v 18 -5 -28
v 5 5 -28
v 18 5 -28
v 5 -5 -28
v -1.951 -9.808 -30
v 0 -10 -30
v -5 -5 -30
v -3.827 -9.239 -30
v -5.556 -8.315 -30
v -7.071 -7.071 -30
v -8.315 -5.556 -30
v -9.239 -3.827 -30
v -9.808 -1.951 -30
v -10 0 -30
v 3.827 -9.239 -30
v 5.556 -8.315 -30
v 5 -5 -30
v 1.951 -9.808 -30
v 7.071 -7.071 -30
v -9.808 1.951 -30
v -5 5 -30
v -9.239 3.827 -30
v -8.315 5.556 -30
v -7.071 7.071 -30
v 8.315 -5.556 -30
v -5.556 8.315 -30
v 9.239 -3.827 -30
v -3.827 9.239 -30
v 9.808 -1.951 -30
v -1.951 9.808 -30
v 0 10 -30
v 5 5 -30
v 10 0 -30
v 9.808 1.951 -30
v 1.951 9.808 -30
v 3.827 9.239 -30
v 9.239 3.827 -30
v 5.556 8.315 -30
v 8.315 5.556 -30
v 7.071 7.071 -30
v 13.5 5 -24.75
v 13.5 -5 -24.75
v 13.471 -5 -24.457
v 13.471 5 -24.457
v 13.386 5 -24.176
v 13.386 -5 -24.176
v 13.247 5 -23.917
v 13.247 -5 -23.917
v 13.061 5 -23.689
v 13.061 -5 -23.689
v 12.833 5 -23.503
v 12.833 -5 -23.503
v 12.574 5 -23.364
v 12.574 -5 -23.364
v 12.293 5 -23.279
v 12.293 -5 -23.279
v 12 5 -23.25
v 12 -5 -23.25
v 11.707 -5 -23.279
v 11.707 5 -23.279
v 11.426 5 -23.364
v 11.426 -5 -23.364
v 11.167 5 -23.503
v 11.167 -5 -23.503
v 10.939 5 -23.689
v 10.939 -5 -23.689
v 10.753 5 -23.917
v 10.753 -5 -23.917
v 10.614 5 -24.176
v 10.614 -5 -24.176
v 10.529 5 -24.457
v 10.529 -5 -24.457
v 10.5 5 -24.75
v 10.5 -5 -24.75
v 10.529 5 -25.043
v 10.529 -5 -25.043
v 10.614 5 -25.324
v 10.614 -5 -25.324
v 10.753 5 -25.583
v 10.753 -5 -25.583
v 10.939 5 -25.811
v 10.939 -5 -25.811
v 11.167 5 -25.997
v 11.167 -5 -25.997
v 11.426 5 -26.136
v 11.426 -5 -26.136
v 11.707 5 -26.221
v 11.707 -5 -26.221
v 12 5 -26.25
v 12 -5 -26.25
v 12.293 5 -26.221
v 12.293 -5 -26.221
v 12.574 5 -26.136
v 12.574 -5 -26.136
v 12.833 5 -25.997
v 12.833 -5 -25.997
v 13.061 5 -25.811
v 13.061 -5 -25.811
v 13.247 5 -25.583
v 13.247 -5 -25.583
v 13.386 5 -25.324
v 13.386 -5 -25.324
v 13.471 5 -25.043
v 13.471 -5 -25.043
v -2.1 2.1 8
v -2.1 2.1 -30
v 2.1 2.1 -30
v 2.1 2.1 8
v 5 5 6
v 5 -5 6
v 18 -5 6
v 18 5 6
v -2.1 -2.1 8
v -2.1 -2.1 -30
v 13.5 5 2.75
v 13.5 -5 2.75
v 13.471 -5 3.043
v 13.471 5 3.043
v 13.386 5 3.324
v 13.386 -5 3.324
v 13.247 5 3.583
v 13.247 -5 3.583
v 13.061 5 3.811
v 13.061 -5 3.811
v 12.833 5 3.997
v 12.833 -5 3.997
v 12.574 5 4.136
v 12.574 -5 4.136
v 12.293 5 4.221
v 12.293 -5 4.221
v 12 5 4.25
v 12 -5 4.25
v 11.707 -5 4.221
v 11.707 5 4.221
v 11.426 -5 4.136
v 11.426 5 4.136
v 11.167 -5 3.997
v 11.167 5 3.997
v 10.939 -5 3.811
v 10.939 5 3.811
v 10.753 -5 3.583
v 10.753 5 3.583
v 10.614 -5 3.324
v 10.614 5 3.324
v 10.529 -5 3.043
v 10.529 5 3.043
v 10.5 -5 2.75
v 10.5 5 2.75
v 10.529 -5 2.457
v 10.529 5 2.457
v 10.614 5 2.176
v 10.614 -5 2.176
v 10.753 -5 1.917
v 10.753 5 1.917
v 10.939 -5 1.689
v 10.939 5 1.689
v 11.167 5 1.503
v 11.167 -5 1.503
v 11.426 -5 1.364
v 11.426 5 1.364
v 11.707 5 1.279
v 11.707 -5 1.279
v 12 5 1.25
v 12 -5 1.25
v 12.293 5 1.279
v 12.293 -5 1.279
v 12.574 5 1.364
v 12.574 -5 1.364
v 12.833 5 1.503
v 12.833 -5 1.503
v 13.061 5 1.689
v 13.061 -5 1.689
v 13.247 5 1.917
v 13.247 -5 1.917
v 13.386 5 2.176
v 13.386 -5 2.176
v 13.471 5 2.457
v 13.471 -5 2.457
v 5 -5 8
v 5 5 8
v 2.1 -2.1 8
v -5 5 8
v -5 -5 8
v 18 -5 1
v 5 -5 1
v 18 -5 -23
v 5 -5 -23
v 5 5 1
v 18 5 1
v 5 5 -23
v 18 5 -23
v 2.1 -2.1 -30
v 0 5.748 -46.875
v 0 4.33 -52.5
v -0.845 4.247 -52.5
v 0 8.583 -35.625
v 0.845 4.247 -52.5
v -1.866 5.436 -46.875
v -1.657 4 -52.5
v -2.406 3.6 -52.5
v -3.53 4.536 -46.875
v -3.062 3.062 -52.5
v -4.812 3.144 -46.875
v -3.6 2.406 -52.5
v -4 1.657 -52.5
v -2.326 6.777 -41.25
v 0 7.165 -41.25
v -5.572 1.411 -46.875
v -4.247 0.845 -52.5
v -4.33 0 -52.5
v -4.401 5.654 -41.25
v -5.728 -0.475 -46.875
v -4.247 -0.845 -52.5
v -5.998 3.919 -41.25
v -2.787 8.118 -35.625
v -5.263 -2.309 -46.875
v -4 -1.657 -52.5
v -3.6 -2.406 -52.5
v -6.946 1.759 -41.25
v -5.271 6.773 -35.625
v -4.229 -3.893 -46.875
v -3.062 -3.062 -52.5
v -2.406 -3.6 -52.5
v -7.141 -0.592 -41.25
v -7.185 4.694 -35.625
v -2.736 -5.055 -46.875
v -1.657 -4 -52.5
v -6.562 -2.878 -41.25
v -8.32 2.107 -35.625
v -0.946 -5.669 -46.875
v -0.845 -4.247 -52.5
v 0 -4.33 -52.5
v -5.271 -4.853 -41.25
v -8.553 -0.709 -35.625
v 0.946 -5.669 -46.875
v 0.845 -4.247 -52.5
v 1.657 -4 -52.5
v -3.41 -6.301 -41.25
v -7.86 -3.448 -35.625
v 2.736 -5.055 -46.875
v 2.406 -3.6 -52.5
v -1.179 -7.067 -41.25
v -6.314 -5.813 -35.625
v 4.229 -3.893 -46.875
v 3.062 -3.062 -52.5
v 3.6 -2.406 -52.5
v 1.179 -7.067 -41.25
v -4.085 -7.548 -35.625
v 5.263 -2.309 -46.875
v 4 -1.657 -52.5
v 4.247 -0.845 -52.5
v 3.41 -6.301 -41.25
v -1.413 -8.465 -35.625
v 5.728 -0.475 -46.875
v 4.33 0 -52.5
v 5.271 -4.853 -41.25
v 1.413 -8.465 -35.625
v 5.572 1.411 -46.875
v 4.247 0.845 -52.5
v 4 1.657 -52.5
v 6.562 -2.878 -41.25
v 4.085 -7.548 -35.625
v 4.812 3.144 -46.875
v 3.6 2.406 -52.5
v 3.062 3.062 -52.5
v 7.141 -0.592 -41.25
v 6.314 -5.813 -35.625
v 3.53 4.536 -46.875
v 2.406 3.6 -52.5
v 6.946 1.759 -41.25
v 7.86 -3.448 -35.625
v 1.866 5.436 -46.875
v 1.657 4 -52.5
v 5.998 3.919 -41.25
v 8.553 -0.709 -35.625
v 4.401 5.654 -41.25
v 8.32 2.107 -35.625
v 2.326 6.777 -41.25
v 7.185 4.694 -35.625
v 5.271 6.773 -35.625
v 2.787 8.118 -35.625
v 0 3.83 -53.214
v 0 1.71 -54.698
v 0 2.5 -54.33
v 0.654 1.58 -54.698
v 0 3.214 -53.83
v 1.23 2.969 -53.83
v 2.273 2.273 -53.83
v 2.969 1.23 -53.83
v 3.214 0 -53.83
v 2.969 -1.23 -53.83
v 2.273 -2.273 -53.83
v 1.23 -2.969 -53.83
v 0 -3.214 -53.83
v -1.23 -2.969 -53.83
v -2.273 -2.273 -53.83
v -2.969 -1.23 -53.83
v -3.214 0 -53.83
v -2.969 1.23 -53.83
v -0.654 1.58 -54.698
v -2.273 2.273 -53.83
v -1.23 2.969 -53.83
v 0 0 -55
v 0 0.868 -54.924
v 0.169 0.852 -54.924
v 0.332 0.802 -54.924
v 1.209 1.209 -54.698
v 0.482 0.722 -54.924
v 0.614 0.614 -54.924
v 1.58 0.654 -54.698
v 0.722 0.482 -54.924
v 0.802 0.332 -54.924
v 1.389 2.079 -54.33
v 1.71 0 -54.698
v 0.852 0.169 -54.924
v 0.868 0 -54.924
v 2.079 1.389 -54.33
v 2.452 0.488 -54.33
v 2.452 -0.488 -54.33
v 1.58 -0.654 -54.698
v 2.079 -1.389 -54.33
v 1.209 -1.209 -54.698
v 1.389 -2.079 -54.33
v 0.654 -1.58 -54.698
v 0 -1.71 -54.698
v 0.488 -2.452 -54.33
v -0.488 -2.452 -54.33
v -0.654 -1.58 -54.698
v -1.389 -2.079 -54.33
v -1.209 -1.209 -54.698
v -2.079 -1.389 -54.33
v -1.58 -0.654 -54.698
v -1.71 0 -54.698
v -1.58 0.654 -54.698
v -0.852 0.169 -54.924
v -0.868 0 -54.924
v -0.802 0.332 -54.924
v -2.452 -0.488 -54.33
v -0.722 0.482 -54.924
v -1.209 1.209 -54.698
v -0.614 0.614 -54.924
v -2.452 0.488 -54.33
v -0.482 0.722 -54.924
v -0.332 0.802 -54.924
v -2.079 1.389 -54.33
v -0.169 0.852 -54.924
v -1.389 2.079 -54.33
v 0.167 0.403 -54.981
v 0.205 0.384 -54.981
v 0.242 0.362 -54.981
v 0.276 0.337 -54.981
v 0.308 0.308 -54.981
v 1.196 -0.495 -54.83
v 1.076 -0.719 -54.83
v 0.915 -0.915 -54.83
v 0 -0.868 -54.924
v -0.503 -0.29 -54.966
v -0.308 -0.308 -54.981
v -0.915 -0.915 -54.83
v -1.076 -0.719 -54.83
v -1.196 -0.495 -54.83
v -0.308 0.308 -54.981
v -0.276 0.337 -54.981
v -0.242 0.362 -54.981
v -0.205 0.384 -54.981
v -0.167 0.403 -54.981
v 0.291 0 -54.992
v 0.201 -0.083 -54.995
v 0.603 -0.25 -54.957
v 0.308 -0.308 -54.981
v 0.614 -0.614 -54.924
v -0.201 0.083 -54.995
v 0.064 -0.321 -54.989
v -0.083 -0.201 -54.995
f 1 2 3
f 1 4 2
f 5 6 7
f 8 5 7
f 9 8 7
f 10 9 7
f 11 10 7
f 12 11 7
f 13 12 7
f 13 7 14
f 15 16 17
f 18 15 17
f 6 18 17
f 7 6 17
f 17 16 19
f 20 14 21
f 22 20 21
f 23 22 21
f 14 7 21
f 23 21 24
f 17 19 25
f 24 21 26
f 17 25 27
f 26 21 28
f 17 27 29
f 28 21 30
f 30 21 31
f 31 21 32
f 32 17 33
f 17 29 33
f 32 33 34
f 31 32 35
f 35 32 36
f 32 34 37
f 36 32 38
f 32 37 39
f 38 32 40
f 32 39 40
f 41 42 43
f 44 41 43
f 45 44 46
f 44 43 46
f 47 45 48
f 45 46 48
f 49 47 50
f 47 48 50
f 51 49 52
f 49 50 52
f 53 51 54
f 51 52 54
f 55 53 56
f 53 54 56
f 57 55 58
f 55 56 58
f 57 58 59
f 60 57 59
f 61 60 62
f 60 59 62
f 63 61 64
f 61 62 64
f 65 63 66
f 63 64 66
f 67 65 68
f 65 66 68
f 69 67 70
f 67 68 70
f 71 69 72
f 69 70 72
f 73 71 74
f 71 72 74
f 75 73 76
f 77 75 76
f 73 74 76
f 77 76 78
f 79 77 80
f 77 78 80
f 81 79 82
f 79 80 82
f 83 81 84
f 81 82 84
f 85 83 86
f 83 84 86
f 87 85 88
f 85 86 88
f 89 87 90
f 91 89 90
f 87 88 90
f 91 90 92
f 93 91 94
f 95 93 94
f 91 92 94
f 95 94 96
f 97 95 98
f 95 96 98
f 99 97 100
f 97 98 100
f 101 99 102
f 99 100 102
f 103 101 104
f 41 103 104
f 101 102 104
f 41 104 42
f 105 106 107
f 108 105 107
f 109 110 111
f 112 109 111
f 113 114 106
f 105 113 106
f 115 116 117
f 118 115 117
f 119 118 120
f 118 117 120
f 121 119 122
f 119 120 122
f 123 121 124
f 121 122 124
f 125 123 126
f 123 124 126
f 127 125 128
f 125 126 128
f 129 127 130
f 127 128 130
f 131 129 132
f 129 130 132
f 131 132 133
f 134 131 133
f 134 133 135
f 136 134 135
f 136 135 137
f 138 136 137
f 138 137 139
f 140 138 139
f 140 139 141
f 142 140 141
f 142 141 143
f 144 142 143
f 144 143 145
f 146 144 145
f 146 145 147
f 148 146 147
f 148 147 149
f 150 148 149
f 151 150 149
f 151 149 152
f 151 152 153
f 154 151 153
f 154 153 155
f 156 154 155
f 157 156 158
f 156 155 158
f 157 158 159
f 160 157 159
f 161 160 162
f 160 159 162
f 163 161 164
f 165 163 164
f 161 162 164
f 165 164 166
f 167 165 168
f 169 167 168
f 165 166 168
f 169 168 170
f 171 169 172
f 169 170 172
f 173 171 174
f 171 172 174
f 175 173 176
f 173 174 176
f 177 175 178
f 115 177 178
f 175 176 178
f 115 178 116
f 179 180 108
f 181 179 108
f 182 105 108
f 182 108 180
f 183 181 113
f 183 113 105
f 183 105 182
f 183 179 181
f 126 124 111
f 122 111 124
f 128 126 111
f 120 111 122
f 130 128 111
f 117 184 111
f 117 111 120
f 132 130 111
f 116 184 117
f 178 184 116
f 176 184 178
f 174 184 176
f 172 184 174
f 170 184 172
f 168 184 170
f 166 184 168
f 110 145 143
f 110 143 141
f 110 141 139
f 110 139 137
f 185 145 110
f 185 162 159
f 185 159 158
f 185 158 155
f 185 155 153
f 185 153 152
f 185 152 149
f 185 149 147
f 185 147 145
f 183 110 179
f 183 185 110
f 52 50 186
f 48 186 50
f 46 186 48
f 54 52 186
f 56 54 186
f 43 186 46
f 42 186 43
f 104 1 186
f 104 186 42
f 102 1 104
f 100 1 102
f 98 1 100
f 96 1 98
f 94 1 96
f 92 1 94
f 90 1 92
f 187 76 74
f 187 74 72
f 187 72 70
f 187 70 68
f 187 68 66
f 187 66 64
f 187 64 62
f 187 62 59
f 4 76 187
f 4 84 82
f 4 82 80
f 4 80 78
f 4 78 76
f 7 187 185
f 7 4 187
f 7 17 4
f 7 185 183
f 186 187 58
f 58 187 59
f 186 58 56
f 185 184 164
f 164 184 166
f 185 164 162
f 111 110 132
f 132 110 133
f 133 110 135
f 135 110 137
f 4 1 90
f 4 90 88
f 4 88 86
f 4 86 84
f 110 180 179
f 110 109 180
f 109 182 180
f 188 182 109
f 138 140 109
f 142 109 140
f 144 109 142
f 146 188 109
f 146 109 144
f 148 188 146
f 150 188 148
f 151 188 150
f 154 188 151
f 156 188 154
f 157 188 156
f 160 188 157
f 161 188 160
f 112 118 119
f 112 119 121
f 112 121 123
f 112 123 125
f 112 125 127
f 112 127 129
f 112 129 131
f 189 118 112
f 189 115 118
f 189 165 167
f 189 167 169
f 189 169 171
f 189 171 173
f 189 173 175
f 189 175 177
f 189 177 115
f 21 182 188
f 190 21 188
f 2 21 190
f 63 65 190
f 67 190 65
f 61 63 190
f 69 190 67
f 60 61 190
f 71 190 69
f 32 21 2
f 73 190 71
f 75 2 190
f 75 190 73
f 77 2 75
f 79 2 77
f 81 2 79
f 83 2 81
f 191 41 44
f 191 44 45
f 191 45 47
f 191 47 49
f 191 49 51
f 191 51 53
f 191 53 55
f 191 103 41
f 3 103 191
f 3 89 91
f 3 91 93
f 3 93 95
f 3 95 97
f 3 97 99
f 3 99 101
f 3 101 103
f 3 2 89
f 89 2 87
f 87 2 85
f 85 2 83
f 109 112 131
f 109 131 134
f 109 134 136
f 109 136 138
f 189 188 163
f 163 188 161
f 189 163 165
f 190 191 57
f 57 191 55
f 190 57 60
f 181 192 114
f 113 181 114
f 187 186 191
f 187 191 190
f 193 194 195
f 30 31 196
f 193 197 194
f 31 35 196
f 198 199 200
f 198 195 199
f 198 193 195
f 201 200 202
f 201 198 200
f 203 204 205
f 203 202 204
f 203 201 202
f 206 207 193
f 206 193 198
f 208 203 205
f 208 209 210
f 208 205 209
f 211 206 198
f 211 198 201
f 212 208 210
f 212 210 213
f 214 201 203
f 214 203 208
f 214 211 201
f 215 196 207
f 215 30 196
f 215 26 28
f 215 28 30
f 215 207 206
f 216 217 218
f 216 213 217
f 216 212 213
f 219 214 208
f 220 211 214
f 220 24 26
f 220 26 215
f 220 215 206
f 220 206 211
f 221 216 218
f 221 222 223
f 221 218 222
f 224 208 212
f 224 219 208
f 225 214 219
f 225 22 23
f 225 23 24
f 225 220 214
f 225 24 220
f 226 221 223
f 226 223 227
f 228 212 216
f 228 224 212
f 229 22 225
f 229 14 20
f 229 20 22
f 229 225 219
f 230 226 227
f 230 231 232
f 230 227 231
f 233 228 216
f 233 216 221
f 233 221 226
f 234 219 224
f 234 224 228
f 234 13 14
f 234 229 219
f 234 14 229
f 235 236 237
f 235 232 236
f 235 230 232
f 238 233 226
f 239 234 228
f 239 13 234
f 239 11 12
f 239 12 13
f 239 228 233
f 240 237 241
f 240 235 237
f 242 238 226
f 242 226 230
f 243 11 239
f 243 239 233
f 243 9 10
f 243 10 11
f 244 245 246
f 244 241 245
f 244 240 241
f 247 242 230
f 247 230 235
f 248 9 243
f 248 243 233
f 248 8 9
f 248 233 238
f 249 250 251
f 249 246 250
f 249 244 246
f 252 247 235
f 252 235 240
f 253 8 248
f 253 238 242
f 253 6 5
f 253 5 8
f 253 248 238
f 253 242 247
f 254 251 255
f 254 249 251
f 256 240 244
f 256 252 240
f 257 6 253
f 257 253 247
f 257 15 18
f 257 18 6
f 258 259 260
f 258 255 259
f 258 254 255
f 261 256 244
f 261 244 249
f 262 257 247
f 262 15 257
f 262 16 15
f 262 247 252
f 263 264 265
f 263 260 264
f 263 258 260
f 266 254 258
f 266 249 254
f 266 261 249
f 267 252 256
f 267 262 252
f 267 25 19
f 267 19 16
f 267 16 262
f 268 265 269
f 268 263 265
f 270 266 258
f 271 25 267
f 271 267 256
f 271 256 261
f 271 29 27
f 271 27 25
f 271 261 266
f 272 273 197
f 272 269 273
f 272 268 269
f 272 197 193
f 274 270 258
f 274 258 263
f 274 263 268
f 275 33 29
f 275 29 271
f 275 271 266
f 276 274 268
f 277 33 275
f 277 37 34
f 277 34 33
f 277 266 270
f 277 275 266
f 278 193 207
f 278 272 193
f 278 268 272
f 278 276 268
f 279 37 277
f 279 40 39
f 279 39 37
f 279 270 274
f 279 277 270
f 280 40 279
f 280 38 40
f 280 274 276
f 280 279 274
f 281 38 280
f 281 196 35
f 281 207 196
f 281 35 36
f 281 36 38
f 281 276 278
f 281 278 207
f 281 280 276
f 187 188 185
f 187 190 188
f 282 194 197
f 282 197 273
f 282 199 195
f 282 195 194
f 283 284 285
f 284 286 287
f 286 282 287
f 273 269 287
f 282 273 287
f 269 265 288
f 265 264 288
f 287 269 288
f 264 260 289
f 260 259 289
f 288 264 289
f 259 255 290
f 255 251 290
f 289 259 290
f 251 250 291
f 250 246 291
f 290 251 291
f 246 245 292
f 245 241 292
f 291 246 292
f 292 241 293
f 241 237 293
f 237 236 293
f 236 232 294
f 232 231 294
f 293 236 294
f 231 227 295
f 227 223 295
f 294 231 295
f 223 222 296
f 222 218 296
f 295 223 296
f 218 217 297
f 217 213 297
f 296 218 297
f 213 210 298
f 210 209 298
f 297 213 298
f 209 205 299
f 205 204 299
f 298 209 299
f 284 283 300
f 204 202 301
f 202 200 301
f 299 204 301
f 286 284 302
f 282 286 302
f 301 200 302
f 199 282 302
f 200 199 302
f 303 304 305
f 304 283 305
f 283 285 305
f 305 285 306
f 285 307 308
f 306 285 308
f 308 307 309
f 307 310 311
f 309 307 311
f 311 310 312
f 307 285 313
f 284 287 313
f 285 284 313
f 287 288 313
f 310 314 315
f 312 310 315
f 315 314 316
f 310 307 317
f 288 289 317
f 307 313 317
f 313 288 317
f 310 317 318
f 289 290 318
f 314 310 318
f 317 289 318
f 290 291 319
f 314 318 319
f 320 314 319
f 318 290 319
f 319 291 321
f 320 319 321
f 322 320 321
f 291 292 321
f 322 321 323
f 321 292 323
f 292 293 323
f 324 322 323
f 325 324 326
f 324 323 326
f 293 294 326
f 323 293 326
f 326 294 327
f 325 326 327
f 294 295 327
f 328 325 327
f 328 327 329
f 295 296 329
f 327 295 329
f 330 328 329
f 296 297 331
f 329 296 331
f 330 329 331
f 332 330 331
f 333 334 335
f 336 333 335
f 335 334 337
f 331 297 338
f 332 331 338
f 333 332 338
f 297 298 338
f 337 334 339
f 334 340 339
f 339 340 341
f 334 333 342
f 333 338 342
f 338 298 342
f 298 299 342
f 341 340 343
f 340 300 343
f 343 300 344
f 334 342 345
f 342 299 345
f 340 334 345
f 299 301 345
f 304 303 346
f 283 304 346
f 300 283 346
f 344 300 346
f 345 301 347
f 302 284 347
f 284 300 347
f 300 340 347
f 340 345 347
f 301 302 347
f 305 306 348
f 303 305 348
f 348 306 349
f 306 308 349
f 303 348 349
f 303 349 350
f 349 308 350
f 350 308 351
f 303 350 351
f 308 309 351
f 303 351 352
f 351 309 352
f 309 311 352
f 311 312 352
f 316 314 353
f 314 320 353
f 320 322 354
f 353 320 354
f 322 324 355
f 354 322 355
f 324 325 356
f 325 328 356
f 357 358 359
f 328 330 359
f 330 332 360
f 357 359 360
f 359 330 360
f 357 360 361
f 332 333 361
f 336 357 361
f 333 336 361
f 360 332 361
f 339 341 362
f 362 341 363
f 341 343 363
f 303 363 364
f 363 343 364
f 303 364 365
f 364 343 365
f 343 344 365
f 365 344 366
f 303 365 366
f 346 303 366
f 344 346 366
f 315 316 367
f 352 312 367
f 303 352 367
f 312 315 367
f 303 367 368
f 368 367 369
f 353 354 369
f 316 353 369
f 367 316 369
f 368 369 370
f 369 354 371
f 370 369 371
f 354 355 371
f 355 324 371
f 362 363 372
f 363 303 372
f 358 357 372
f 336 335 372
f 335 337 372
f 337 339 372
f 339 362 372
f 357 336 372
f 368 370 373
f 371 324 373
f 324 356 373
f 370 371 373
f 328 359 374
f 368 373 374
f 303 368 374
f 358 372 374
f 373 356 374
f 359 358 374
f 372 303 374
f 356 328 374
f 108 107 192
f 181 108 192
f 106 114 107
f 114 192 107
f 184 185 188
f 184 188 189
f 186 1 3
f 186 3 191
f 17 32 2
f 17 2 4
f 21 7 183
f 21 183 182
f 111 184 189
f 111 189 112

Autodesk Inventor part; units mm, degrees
ref_plane "YZ Plane" through (0, 0, 0) normal (1, 0, 0) x (0, 1, 0)
ref_plane "XZ Plane" through (0, 0, 0) normal (0, 1, 0) x (-1, 0, 0)
sketch "Sketch1" plane through (0, 0, 0) normal (0, 0, 1) x (1, 0, 0)
  line L0 (3.15, -3.15) -> (-3.15, -3.15)
  line L1 (-3.15, -3.15) -> (-3.15, 3.15)
  line L2 (-3.15, 3.15) -> (3.15, 3.15)
  line L3 (3.15, 3.15) -> (3.15, -3.15)
  line L4 (3.15, -3.15) -> (-3.15, 3.15) construction
  line L5 (-3.15, -3.15) -> (3.15, 3.15) construction
  line L6 (5, -5) -> (-5, -5)
  line L7 (-5, -5) -> (-5, 5)
  line L8 (-5, 5) -> (5, 5)
  line L9 (5, 5) -> (5, -5)
  line L10 (5, -5) -> (-5, 5) construction
  line L11 (-5, -5) -> (5, 5) construction
  point P0 (0, 0)
  dimension "d0" = 6.3
  dimension "d1" = 6.3
  dimension "d2" = 10
  dimension "d3" = 10
extrude "Extrusion1" add sketch "Sketch1" along normal mid plane 60
sketch "Sketch3" plane through (0, 0, 0) normal (1, 0, 0) x (0, 1, 0)
  line L0 (5, -30) -> (-5, -30) projected
  line L1 (0, -30) -> (0, -50)
  line L2 (0, -30) -> (10, -30)
  arc A0 (0, -55) -> (4.3301, -52.5) centre (0, -50) ccw
  line L3 (0, -55) -> (0, -30)
  line L4 (4.3301, -52.5) -> (10, -30)
  point P0 (0, 0)
  dimension "d19" = 20
  dimension "d20" = 10
  dimension "d21" = 10
  dimension "d22" = 5
revolve "Revolution1" add sketch "Sketch3" angle 360 about axis through (0, 0, -30) along (0, 0, -1)
sketch "Sketch4" plane through (0, 0, 0) normal (0, 1, 0) x (-1, 0, 0)
  point P0 (0, 0)
sketch "Sketch5" plane through (0, 0, 0) normal (0, 1, 0) x (-1, 0, 0)
  line L0 (-5, -30) -> (-5, 30) projected
  line L1 (-5, 0) -> (-5, -23)
  line L2 (-5, 30) -> (-5, -30) projected
  line L3 (-5, 0) -> (-5, 1)
  line L4 (-5, 1) -> (-5, 6)
  line L5 (-5, 6) -> (-18, 6)
  line L6 (-5, -23) -> (-5, -28)
  line L7 (-5, -28) -> (-18, -28)
  line L8 (-18, -28) -> (-18, -23)
  line L9 (-18, -23) -> (-5, -23)
  line L10 (-5, 1) -> (-18, 1)
  line L11 (-18, 1) -> (-18, 6)
  point P0 (-5, 6)
  point P1 (-5, -28)
  point P2 (-5, -23)
  point P3 (-5, 1)
  dimension "d135" = 23
  dimension "d136" = 1
  dimension "d138" = 13
  dimension "d139" = 5
  dimension "d140" = 13
  dimension "d141" = 5
  dimension "d143" = 5
extrude "Extrusion2" add sketch "Sketch5" along normal mid plane 10
sketch "Sketch7" plane through (-5, -5, 30) normal (0, -1, 0) x (1, 0, 0)
  line L0 (10, 0) -> (10, -60) projected
  line L1 (23, -53) -> (10, -53) projected
  line L2 (10, -53) -> (10, -29) projected
  line L3 (10, -53) -> (10, -29)
  line L4 (10, -29) -> (10, -27.25)
  line L5 (10, -29) -> (23, -29) projected
  line L6 (10, -27.25) -> (10, -29)
  line L7 (10, -53) -> (10, -54.75)
  line L8 (10, -54.75) -> (17, -54.75)
  line L9 (10, -27.25) -> (17, -27.25)
  circle A0 centre (17, -54.75) radius 1.5
  circle A1 centre (17, -27.25) radius 1.5
  point P0 (10, -23.5)
  point P1 (10, -48.5)
  dimension "d144" = 24
  dimension "d145" = 1.75
  dimension "d146" = 1.75
  dimension "d147" = 7
  dimension "d148" = 7
  dimension "d149" = 3
  dimension "d150" = 3
extrude "Extrusion3" cut sketch "Sketch7" against normal through all
sketch "Sketch19" plane through (0, 0, 30) normal (0, 0, 1) x (1, 0, 0)
  line L0 (0, 0) -> (2.1, 0)
  line L1 (2.1, 0) -> (2.1, -2.1)
  line L2 (2.1, -2.1) -> (-2.1, -2.1)
  line L3 (-2.1, -2.1) -> (-2.1, 2.1)
  line L4 (-2.1, 2.1) -> (2.1, 2.1)
  line L5 (2.1, 2.1) -> (2.1, 0)
  line L6 (3.15, 3.15) -> (-3.15, 3.15) projected
  line L7 (2.1, 2.1) -> (3.15, 3.15)
  line L8 (3.15, -3.15) -> (3.15, 3.15) projected
  line L9 (3.15, 3.15) -> (3.15, -3.15)
  line L10 (3.15, -3.15) -> (-3.15, -3.15)
  line L11 (-3.15, -3.15) -> (-3.15, 3.15)
  line L12 (-3.15, 3.15) -> (3.15, 3.15)
  point P0 (-3.15, 3.15)
  dimension "d151" = 2.1
  dimension "d152" = 2.1
  dimension "d153" = 4.2
  dimension "d154" = 4.2
extrude "Extrusion13" add sketch "Sketch19" against normal blind 80
ref_plane "Work Plane2" through (0, 0, -26) normal (0, 0, 1) x (1, 0, 0)
sketch "Sketch22" plane through (-5, -5, 30) normal (0, -1, 0) x (1, 0, 0)
  line L0 (0, -60) -> (0, 0) projected
  line L1 (10, -24) -> (23, -24) projected
  line L2 (-4.5508, 0) -> (19.955, 0)
  line L3 (19.955, 0) -> (19.955, -22)
  line L4 (19.955, -22) -> (-10.1203, -22)
  line L5 (-10.1203, -22) -> (-10.1203, 0)
  line L6 (-10.1203, 0) -> (19.955, 0)
  point P0 (5, -30)
  point P1 (0, -31)
  dimension "d176" = 22
extrude "Extrusion16" cut sketch "Sketch22" against normal through all
properties part number "fot"
